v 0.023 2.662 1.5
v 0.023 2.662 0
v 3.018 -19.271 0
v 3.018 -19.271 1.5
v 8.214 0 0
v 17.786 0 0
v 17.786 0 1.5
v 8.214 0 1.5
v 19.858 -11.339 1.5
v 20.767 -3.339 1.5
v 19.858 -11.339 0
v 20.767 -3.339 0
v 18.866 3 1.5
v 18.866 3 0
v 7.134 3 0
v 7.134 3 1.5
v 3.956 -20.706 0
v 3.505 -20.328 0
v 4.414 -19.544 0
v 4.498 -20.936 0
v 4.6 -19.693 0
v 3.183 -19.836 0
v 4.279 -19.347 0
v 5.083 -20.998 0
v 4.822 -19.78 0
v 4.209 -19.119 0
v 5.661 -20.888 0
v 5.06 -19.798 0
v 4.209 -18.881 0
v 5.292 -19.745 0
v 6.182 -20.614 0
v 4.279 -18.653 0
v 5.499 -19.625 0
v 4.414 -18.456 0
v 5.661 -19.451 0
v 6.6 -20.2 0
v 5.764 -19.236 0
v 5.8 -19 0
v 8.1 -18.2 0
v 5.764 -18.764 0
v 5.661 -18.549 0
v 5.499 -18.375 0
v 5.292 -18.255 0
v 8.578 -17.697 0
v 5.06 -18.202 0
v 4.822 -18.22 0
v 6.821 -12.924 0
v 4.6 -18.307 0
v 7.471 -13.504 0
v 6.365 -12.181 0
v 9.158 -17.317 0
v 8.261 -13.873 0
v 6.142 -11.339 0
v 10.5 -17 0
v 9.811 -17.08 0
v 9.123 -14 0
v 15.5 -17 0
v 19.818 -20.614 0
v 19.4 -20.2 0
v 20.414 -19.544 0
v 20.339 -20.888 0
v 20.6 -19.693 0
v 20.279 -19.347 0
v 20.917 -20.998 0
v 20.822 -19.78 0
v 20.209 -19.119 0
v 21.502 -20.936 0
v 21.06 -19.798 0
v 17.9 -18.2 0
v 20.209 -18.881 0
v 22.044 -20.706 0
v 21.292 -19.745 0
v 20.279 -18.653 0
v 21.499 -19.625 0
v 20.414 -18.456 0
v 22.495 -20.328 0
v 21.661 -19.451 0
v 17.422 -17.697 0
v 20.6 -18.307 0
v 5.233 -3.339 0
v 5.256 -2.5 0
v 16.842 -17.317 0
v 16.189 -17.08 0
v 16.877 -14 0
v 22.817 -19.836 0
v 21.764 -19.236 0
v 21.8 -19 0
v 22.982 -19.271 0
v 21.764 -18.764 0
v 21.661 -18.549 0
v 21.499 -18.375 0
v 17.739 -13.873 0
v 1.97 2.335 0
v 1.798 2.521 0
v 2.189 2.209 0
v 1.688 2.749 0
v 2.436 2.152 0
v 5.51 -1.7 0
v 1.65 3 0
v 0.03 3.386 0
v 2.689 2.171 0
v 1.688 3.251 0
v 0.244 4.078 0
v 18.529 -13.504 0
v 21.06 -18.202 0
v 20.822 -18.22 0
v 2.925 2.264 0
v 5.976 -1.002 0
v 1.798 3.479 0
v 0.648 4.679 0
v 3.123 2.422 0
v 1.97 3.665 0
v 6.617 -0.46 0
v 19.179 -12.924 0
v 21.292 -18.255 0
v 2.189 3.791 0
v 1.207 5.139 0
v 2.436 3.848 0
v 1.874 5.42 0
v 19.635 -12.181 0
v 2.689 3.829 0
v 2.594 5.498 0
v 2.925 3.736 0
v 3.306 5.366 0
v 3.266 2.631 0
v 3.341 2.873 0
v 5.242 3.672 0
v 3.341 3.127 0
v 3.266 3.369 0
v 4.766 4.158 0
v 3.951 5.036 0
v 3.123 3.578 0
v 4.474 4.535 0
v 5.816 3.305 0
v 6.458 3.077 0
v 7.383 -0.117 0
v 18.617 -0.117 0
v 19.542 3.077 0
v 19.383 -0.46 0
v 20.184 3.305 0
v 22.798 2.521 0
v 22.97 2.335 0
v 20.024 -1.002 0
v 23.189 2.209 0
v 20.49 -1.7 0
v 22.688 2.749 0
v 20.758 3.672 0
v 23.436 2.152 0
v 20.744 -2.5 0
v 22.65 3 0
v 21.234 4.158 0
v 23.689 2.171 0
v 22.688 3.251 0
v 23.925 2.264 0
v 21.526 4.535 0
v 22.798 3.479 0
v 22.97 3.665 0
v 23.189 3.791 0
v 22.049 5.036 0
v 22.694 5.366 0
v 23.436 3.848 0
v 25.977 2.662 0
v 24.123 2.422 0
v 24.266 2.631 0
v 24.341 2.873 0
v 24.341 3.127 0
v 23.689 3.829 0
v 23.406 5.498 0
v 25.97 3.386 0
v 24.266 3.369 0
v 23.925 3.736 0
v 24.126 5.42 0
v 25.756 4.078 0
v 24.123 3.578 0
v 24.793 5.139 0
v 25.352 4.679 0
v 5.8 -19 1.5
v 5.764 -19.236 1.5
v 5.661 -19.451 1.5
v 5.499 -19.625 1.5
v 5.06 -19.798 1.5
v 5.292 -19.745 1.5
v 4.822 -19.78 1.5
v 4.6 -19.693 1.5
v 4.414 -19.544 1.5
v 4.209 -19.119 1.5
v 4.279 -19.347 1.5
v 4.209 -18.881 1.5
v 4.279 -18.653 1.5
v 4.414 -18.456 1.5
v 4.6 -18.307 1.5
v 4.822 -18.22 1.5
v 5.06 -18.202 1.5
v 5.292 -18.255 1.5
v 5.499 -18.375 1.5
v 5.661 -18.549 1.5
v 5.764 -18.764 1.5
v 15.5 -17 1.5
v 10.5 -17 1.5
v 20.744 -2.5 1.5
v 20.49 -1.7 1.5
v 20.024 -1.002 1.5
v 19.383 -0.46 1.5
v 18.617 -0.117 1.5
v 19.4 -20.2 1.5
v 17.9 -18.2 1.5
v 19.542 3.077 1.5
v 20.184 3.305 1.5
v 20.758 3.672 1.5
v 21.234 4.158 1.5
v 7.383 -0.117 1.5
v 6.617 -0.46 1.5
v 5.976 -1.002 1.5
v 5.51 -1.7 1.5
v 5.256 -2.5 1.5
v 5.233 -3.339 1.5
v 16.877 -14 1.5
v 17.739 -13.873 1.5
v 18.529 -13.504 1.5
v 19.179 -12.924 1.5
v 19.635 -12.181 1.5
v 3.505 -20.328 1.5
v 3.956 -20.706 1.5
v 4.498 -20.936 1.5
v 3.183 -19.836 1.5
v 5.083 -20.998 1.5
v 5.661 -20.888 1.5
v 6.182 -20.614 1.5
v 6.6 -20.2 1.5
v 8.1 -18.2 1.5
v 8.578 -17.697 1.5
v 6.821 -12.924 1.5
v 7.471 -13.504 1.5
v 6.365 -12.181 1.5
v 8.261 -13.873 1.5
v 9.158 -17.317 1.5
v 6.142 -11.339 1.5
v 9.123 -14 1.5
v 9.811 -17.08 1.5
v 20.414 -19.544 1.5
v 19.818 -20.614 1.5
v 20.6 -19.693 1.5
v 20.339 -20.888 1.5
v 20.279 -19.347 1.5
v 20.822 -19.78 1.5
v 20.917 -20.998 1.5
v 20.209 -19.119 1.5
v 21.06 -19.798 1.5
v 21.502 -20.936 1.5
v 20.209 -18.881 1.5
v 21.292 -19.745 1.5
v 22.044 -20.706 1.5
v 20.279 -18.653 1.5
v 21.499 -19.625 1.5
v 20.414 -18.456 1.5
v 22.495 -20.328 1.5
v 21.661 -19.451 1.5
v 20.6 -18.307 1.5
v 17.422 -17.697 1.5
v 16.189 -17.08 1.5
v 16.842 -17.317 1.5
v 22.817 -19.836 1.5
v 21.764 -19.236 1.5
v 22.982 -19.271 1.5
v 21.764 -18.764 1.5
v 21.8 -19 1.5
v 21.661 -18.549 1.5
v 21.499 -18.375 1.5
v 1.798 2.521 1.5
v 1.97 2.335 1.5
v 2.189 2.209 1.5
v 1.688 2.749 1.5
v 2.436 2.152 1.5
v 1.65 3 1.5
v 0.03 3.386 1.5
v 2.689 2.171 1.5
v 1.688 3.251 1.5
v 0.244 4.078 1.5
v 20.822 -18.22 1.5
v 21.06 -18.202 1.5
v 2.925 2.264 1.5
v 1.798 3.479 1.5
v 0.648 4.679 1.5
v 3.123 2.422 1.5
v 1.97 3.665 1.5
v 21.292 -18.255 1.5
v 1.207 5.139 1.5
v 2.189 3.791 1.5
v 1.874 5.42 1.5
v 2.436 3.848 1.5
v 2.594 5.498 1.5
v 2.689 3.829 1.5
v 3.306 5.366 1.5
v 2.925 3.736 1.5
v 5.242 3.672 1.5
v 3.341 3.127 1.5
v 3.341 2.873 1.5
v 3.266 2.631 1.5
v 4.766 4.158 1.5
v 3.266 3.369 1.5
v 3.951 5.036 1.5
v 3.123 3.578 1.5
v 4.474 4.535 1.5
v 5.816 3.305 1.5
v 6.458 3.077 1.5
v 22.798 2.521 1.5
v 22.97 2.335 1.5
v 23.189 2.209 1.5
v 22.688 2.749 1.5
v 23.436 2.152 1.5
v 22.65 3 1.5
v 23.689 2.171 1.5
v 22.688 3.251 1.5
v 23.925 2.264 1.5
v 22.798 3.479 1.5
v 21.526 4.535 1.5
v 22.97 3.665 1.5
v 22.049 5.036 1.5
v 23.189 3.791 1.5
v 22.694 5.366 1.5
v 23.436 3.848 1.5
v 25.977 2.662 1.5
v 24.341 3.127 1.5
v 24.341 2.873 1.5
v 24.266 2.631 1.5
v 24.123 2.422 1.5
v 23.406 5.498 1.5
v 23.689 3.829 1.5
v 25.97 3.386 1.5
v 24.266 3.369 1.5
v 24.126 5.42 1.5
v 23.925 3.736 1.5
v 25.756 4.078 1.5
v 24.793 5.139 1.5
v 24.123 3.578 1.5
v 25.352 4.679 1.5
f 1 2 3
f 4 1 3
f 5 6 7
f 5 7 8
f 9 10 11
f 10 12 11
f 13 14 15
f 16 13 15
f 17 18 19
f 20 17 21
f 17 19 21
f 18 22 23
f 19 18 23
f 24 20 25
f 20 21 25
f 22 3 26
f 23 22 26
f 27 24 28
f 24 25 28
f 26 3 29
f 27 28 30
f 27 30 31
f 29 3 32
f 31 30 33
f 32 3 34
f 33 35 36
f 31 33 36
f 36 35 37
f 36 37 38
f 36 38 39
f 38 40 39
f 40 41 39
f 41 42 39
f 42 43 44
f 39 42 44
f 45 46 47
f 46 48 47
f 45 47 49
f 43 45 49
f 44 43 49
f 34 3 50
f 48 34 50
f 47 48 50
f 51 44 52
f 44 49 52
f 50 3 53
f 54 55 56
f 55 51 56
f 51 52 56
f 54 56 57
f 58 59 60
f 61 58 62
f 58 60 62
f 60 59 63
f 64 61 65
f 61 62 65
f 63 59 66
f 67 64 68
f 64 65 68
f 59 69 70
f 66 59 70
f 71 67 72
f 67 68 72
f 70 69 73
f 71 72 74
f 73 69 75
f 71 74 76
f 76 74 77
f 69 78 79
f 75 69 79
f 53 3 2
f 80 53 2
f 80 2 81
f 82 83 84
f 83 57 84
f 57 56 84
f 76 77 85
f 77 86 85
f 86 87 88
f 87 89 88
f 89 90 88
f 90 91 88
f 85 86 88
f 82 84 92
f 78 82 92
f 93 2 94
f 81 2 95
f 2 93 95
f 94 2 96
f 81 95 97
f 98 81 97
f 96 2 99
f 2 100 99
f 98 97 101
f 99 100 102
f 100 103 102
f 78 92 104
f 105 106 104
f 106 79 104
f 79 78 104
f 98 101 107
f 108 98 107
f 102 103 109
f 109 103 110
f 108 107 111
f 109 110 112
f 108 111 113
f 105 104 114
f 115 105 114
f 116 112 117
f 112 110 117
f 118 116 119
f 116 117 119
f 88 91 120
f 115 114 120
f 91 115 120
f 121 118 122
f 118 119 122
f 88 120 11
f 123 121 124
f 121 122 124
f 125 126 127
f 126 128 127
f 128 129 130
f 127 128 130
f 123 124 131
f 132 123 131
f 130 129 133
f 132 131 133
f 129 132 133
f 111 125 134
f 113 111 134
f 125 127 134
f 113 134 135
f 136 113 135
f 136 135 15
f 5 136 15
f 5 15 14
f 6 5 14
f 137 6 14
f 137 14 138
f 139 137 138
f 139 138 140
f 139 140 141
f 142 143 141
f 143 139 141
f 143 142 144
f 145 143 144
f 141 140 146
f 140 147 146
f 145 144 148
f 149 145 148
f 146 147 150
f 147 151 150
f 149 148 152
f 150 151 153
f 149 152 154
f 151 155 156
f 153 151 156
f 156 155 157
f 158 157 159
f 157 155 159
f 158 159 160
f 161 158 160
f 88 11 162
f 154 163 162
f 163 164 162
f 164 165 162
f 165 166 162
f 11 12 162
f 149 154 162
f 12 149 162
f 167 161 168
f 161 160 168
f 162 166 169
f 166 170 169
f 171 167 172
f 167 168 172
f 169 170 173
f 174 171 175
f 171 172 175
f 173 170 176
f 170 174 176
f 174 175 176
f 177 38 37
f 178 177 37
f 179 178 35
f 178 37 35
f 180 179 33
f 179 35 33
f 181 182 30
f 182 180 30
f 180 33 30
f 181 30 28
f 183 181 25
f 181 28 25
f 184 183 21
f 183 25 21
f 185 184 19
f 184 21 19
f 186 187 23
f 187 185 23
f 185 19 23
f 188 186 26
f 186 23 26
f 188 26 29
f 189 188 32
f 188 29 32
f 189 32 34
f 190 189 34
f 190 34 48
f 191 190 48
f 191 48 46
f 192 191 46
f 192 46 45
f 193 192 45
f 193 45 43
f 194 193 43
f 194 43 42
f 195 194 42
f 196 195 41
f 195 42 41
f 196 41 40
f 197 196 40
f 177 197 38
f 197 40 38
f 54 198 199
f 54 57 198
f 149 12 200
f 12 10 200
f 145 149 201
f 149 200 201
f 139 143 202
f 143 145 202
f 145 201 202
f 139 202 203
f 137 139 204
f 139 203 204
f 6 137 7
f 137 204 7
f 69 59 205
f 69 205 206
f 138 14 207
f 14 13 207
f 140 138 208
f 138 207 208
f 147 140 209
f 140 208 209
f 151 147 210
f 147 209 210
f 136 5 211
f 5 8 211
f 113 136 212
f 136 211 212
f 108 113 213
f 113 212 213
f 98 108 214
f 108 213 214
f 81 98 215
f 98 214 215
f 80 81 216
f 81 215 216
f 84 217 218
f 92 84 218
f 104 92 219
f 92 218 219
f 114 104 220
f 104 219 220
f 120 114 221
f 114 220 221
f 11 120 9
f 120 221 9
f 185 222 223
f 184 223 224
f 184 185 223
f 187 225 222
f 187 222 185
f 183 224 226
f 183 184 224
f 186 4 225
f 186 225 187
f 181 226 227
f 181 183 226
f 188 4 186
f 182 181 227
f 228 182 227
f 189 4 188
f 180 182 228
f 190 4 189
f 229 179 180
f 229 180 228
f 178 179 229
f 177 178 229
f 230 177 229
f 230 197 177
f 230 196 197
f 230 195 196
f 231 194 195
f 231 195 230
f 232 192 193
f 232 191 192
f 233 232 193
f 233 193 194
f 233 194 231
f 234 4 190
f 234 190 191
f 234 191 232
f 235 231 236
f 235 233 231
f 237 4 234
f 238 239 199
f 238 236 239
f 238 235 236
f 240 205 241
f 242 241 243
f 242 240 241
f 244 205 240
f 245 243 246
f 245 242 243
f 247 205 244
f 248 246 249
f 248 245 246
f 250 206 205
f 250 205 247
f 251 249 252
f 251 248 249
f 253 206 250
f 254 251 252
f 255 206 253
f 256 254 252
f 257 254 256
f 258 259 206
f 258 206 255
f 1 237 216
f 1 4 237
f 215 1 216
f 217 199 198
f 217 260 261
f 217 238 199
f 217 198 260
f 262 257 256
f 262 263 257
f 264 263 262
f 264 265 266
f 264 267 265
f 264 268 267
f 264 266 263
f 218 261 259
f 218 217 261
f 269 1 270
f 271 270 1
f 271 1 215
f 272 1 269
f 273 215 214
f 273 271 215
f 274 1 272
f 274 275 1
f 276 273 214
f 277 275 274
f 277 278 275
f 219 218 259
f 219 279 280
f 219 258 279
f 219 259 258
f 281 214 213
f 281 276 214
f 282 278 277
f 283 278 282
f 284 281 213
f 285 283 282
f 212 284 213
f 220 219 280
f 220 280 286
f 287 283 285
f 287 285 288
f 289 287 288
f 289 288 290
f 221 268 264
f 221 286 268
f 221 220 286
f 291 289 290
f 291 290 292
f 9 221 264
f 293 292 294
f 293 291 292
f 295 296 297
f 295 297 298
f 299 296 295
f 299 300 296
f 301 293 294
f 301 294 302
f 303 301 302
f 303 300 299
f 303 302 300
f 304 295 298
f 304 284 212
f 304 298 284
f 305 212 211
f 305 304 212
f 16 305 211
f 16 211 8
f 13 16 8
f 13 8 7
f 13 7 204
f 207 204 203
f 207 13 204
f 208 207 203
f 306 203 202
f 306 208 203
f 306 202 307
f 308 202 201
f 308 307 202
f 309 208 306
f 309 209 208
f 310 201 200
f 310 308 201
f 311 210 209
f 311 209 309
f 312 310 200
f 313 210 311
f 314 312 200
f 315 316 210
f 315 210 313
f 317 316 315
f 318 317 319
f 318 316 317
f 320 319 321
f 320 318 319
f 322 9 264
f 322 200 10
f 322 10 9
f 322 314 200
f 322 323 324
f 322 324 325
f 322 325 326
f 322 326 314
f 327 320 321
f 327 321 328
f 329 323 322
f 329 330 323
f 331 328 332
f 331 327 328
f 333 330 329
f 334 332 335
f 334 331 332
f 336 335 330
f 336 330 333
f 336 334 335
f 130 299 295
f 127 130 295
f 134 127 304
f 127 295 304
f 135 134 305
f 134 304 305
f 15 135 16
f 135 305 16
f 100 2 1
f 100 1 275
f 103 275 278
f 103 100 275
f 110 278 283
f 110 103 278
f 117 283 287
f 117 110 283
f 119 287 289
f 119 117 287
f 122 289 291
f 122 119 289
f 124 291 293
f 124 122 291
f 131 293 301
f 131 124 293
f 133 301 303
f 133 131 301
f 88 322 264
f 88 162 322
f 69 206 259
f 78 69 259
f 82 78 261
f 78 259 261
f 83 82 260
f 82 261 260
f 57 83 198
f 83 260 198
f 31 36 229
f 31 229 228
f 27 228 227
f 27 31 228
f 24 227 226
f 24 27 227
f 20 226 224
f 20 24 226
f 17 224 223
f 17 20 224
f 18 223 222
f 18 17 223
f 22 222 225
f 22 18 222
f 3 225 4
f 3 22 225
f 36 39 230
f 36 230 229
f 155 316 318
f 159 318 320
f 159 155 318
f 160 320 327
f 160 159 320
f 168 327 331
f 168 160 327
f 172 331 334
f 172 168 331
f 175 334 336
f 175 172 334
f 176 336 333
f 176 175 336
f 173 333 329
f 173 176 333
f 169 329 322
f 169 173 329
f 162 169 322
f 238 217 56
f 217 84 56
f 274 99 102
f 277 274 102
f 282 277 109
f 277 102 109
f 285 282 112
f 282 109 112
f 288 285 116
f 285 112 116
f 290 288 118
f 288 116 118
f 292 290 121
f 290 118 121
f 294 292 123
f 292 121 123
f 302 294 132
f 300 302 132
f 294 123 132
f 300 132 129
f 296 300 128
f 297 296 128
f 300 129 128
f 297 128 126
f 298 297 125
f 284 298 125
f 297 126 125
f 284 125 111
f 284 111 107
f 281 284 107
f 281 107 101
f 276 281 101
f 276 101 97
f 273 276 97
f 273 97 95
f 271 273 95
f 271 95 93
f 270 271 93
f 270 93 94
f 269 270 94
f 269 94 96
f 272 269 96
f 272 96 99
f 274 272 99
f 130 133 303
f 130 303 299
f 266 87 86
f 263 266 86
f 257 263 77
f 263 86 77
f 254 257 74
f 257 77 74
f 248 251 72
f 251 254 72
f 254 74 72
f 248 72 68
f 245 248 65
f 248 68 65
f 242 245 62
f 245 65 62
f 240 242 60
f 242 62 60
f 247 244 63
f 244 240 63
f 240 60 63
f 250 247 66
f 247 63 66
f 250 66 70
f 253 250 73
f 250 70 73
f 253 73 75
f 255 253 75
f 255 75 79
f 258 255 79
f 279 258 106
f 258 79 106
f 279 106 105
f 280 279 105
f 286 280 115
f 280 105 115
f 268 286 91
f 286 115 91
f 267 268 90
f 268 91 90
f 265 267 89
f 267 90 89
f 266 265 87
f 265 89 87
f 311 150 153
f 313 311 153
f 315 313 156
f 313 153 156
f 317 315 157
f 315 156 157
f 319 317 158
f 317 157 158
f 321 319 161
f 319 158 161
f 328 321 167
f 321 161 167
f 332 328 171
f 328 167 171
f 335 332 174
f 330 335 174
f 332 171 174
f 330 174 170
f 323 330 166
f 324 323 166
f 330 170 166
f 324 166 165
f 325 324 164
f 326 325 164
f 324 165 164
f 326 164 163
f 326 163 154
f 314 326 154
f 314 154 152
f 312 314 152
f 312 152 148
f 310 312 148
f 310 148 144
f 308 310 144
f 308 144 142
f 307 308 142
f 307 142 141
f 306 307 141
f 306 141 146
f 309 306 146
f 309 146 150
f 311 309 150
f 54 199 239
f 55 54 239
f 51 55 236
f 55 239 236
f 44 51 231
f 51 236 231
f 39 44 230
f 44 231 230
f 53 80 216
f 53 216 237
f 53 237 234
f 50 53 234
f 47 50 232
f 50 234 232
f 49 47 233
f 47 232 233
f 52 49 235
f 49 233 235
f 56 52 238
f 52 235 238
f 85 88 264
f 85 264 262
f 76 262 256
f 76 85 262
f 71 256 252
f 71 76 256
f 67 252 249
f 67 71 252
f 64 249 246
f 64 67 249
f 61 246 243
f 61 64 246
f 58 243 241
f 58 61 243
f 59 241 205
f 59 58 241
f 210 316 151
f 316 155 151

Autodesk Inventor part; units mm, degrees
ref_plane "YZ Plane" through (0, 0, 0) normal (1, 0, 0) x (0, 1, 0)
ref_plane "XZ Plane" through (0, 0, 0) normal (0, 1, 0) x (-1, 0, 0)
ref_plane "XY Plane" through (0, 0, 0) normal (0, 0, 1) x (1, 0, 0)
sketch "スケッチ2" plane through (0, 0, 0) normal (0, 0, 1) x (1, 0, 0)
  line L0 (0, 0) -> (26, 0)
  line L1 (26, 0) -> (26, 33)
  line L2 (26, 33) -> (0, 33)
  line L3 (0, 33) -> (0, 0)
  line L4 (0, 0) -> (26, 0)
  line L5 (26, 0) -> (26, 24)
  line L6 (26, 24) -> (0, 24) construction
  line L7 (0, 24) -> (0, 0)
  circle A0 centre (13, 24) radius 13
  circle A1 centre (13, 24) radius 6.25
  line L8 (26, 0) -> (0, 0)
  line L9 (26, 24.5219) -> (26, -21)
  line L10 (26, -21) -> (0, -21)
  line L11 (0, -21) -> (0, 24)
  circle A2 centre (5, -19) radius 0.8
  circle A3 centre (21, -19) radius 0.8
  line L12 (0, 24) -> (26, 24)
  point P0 (22.3808, 33)
  point P1 (3.6192, 33)
  point P2 (0, 0)
  point P3 (26, 24)
  point P4 (0, 24)
  point P5 (6.75, 24)
  point P6 (19, 22.25)
  point P7 (19.25, 24)
  dimension "d0" = 26
  dimension "d1" = 33
  dimension "d2" = 24
  dimension "d3" = 12.5
  dimension "d14" = 26
  dimension "d17" = 1.6
  dimension "d18" = 1.6
  dimension "d19" = 2
  dimension "d20" = 2
  dimension "d21" = 5
  dimension "d22" = 5
  dimension "d23" = 13
  dimension "d25" = 45
  dimension "d26" = 0
extrude "押し出し1" add sketch "スケッチ2" along normal blind 1.5 contours L3 A0 L1 L0 | L0 L9 L10 L11 | L12 A1 A0 | A0 L2 L12 A1 | A0 L2 L1 | L12 A1 | A1 L12
sketch "スケッチ3" plane through (0, 0, 0) normal (0, 0, -1) x (-1, 0, 0)
  circle A0 centre (-2.5, 24) radius 0.85 projected
  circle A1 centre (-23.5, 24) radius 0.85 projected
  circle A2 centre (-23.5, 3) radius 0.85 projected
  circle A3 centre (-2.5, 3) radius 0.85 projected
  circle A4 centre (-13, 24) radius 6.25 projected
  line L0 (-2.5, 24) -> (-23.5, 24)
  line L1 (-23.5, 24) -> (-23.5, 3)
  line L2 (-23.5, 3) -> (-2.5, 3)
  line L3 (-2.5, 3) -> (-2.5, 24)
  circle A5 centre (-13, 24) radius 10.25
  line L4 (-5.5, 24) -> (-20.5, 24)
  line L5 (-20.5, 24) -> (-20.5, 3)
  line L6 (-20.5, 3) -> (-5.5, 3)
  line L7 (-5.5, 3) -> (-5.5, 24)
  arc A6 (0, 24) -> (-3.6192, 33) centre (-13, 24) ccw projected
  line L8 (-26, 33) -> (-3.6192, 33) projected
  line L9 (-26, -21) -> (-26, 33) projected
  line L10 (0, -21) -> (-26, -21) projected
  line L11 (0, 24) -> (0, -21) projected
  circle A7 centre (-5, -19) radius 0.8 projected
  circle A8 centre (-21, -19) radius 0.8 projected
  line L12 (-37.149, 0) -> (-22.2321, 0)
  line L13 (-22.2321, 0) -> (-8, 0)
  circle A9 centre (-23.5, 3) radius 2.5
  circle A10 centre (-2.5, 3) radius 2.5
  line L14 (-21.5265, 4.5347) -> (-18, 0)
  line L15 (-4.4735, 4.5347) -> (-8, 0)
  line L16 (-18, 0) -> (-8, 0)
  circle A11 centre (-21, -19) radius 2
  circle A12 centre (-5, -19) radius 2
  line L17 (-26, -21) -> (-26, 33) projected
  line L18 (-19.4, -20.2) -> (-17, -17)
  line L19 (-17, -17) -> (-9, -17)
  line L20 (-9, -17) -> (-6.6, -20.2)
  line L21 (-25.977, 2.6617) -> (-22.9816, -19.2706)
  line L22 (-0.023, 2.6617) -> (-3.0184, -19.2706)
  line L23 (-23.5, 3) -> (-21, -19)
  line L24 (-2.5, 3) -> (-5, -19)
  line L25 (-23.1591, 0) -> (-2.8409, 0)
  line L26 (-21.5682, -14) -> (-4.4318, -14)
  line L27 (-21.1462, 0) -> (-19.5553, -14)
  line L28 (-4.8538, 0) -> (-6.4447, -14)
  point P0 (0, 0)
  point P1 (-5.5, 17.0134)
  point P2 (-20.5, 17.0134)
  point P3 (-13, 0)
  point P4 (-13, -21)
  point P5 (-13, -17)
  point P6 (-21, -21)
  point P7 (-5, -21)
  point P8 (-25.6135, 0)
  point P9 (-26, 0)
  point P10 (0, 3)
  point P11 (-8.0946, 33)
  point P12 (-17.9054, 33)
  point P13 (-26, 3)
  point P14 (-20.5, 3.2147)
  point P15 (-5.5, 3.2147)
  point P16 (-3.35, 3)
  point P17 (-2.5, 3.85)
  point P18 (-2.5, 5.5)
  point P19 (-23.5, 5.5)
  point P20 (-23.5, 3.85)
  point P21 (-22.65, 3)
  point P22 (-5.667, 3)
  point P23 (-20.333, 3)
  dimension "d27" = 4
  dimension "d28" = 3
  dimension "d29" = 3
  dimension "d36" = 3
  dimension "d38" = 10
  dimension "d39" = 8
  dimension "d40" = 3
  dimension "d41" = 3
  dimension "d42" = 2
  dimension "d43" = 2
extrude "押し出し2" cut sketch "スケッチ3" against normal through all contours A0 L3 L0 A5 | A0 A5 L8 A6 L11 A10 L3 | A5 L0 A0 | A0 L0 A4 A1 A5 L8 | L3 A10 L15 L7 A5 A0 | A0 A5 L0 L3 | L0 A5 A0 | A0 A5 L7 L0 | L8 A5 | L7 A5 L5 L0 A4 | A5 A1 L1 A9 L9 L8 | L7 L15 L2 L14 L5 A5 | L3 L2 A3 | A3 L24 L3 | L11 L10 A12 L22 A10 | L0 A4 | A4 L0 | A5 L0 L1 A1 | A1 L0 A5 | L5 L14 A9 L1 A1 A5 | A5 A1 L0 L5 | L2 L24 A3 | A1 A5 L0 | L1 L0 A5 A1 | A9 L21 L12 L9 | L10 A11 L18 L19 L20 A12 | L12 L21 A11 L10 L9 | L25 L28 L26 L27 L13 | L1 L23 A2 | A2 L2 L1 | A2 L23 L2
fillet "フィレット1" radius 3 8 edges at (4.8538, 0, 0.75) (21.1462, 0, 0.75) (19.5553, -14, 0.75) (6.4447, -14, 0.75) (9, -17, 0.75) (17, -17, 0.75) (20.333, 3, 0.75) (5.667, 3, 0.75)
equation "\"d20\" = d19"
properties part number "elbow" material "アルミニウム 6061"
